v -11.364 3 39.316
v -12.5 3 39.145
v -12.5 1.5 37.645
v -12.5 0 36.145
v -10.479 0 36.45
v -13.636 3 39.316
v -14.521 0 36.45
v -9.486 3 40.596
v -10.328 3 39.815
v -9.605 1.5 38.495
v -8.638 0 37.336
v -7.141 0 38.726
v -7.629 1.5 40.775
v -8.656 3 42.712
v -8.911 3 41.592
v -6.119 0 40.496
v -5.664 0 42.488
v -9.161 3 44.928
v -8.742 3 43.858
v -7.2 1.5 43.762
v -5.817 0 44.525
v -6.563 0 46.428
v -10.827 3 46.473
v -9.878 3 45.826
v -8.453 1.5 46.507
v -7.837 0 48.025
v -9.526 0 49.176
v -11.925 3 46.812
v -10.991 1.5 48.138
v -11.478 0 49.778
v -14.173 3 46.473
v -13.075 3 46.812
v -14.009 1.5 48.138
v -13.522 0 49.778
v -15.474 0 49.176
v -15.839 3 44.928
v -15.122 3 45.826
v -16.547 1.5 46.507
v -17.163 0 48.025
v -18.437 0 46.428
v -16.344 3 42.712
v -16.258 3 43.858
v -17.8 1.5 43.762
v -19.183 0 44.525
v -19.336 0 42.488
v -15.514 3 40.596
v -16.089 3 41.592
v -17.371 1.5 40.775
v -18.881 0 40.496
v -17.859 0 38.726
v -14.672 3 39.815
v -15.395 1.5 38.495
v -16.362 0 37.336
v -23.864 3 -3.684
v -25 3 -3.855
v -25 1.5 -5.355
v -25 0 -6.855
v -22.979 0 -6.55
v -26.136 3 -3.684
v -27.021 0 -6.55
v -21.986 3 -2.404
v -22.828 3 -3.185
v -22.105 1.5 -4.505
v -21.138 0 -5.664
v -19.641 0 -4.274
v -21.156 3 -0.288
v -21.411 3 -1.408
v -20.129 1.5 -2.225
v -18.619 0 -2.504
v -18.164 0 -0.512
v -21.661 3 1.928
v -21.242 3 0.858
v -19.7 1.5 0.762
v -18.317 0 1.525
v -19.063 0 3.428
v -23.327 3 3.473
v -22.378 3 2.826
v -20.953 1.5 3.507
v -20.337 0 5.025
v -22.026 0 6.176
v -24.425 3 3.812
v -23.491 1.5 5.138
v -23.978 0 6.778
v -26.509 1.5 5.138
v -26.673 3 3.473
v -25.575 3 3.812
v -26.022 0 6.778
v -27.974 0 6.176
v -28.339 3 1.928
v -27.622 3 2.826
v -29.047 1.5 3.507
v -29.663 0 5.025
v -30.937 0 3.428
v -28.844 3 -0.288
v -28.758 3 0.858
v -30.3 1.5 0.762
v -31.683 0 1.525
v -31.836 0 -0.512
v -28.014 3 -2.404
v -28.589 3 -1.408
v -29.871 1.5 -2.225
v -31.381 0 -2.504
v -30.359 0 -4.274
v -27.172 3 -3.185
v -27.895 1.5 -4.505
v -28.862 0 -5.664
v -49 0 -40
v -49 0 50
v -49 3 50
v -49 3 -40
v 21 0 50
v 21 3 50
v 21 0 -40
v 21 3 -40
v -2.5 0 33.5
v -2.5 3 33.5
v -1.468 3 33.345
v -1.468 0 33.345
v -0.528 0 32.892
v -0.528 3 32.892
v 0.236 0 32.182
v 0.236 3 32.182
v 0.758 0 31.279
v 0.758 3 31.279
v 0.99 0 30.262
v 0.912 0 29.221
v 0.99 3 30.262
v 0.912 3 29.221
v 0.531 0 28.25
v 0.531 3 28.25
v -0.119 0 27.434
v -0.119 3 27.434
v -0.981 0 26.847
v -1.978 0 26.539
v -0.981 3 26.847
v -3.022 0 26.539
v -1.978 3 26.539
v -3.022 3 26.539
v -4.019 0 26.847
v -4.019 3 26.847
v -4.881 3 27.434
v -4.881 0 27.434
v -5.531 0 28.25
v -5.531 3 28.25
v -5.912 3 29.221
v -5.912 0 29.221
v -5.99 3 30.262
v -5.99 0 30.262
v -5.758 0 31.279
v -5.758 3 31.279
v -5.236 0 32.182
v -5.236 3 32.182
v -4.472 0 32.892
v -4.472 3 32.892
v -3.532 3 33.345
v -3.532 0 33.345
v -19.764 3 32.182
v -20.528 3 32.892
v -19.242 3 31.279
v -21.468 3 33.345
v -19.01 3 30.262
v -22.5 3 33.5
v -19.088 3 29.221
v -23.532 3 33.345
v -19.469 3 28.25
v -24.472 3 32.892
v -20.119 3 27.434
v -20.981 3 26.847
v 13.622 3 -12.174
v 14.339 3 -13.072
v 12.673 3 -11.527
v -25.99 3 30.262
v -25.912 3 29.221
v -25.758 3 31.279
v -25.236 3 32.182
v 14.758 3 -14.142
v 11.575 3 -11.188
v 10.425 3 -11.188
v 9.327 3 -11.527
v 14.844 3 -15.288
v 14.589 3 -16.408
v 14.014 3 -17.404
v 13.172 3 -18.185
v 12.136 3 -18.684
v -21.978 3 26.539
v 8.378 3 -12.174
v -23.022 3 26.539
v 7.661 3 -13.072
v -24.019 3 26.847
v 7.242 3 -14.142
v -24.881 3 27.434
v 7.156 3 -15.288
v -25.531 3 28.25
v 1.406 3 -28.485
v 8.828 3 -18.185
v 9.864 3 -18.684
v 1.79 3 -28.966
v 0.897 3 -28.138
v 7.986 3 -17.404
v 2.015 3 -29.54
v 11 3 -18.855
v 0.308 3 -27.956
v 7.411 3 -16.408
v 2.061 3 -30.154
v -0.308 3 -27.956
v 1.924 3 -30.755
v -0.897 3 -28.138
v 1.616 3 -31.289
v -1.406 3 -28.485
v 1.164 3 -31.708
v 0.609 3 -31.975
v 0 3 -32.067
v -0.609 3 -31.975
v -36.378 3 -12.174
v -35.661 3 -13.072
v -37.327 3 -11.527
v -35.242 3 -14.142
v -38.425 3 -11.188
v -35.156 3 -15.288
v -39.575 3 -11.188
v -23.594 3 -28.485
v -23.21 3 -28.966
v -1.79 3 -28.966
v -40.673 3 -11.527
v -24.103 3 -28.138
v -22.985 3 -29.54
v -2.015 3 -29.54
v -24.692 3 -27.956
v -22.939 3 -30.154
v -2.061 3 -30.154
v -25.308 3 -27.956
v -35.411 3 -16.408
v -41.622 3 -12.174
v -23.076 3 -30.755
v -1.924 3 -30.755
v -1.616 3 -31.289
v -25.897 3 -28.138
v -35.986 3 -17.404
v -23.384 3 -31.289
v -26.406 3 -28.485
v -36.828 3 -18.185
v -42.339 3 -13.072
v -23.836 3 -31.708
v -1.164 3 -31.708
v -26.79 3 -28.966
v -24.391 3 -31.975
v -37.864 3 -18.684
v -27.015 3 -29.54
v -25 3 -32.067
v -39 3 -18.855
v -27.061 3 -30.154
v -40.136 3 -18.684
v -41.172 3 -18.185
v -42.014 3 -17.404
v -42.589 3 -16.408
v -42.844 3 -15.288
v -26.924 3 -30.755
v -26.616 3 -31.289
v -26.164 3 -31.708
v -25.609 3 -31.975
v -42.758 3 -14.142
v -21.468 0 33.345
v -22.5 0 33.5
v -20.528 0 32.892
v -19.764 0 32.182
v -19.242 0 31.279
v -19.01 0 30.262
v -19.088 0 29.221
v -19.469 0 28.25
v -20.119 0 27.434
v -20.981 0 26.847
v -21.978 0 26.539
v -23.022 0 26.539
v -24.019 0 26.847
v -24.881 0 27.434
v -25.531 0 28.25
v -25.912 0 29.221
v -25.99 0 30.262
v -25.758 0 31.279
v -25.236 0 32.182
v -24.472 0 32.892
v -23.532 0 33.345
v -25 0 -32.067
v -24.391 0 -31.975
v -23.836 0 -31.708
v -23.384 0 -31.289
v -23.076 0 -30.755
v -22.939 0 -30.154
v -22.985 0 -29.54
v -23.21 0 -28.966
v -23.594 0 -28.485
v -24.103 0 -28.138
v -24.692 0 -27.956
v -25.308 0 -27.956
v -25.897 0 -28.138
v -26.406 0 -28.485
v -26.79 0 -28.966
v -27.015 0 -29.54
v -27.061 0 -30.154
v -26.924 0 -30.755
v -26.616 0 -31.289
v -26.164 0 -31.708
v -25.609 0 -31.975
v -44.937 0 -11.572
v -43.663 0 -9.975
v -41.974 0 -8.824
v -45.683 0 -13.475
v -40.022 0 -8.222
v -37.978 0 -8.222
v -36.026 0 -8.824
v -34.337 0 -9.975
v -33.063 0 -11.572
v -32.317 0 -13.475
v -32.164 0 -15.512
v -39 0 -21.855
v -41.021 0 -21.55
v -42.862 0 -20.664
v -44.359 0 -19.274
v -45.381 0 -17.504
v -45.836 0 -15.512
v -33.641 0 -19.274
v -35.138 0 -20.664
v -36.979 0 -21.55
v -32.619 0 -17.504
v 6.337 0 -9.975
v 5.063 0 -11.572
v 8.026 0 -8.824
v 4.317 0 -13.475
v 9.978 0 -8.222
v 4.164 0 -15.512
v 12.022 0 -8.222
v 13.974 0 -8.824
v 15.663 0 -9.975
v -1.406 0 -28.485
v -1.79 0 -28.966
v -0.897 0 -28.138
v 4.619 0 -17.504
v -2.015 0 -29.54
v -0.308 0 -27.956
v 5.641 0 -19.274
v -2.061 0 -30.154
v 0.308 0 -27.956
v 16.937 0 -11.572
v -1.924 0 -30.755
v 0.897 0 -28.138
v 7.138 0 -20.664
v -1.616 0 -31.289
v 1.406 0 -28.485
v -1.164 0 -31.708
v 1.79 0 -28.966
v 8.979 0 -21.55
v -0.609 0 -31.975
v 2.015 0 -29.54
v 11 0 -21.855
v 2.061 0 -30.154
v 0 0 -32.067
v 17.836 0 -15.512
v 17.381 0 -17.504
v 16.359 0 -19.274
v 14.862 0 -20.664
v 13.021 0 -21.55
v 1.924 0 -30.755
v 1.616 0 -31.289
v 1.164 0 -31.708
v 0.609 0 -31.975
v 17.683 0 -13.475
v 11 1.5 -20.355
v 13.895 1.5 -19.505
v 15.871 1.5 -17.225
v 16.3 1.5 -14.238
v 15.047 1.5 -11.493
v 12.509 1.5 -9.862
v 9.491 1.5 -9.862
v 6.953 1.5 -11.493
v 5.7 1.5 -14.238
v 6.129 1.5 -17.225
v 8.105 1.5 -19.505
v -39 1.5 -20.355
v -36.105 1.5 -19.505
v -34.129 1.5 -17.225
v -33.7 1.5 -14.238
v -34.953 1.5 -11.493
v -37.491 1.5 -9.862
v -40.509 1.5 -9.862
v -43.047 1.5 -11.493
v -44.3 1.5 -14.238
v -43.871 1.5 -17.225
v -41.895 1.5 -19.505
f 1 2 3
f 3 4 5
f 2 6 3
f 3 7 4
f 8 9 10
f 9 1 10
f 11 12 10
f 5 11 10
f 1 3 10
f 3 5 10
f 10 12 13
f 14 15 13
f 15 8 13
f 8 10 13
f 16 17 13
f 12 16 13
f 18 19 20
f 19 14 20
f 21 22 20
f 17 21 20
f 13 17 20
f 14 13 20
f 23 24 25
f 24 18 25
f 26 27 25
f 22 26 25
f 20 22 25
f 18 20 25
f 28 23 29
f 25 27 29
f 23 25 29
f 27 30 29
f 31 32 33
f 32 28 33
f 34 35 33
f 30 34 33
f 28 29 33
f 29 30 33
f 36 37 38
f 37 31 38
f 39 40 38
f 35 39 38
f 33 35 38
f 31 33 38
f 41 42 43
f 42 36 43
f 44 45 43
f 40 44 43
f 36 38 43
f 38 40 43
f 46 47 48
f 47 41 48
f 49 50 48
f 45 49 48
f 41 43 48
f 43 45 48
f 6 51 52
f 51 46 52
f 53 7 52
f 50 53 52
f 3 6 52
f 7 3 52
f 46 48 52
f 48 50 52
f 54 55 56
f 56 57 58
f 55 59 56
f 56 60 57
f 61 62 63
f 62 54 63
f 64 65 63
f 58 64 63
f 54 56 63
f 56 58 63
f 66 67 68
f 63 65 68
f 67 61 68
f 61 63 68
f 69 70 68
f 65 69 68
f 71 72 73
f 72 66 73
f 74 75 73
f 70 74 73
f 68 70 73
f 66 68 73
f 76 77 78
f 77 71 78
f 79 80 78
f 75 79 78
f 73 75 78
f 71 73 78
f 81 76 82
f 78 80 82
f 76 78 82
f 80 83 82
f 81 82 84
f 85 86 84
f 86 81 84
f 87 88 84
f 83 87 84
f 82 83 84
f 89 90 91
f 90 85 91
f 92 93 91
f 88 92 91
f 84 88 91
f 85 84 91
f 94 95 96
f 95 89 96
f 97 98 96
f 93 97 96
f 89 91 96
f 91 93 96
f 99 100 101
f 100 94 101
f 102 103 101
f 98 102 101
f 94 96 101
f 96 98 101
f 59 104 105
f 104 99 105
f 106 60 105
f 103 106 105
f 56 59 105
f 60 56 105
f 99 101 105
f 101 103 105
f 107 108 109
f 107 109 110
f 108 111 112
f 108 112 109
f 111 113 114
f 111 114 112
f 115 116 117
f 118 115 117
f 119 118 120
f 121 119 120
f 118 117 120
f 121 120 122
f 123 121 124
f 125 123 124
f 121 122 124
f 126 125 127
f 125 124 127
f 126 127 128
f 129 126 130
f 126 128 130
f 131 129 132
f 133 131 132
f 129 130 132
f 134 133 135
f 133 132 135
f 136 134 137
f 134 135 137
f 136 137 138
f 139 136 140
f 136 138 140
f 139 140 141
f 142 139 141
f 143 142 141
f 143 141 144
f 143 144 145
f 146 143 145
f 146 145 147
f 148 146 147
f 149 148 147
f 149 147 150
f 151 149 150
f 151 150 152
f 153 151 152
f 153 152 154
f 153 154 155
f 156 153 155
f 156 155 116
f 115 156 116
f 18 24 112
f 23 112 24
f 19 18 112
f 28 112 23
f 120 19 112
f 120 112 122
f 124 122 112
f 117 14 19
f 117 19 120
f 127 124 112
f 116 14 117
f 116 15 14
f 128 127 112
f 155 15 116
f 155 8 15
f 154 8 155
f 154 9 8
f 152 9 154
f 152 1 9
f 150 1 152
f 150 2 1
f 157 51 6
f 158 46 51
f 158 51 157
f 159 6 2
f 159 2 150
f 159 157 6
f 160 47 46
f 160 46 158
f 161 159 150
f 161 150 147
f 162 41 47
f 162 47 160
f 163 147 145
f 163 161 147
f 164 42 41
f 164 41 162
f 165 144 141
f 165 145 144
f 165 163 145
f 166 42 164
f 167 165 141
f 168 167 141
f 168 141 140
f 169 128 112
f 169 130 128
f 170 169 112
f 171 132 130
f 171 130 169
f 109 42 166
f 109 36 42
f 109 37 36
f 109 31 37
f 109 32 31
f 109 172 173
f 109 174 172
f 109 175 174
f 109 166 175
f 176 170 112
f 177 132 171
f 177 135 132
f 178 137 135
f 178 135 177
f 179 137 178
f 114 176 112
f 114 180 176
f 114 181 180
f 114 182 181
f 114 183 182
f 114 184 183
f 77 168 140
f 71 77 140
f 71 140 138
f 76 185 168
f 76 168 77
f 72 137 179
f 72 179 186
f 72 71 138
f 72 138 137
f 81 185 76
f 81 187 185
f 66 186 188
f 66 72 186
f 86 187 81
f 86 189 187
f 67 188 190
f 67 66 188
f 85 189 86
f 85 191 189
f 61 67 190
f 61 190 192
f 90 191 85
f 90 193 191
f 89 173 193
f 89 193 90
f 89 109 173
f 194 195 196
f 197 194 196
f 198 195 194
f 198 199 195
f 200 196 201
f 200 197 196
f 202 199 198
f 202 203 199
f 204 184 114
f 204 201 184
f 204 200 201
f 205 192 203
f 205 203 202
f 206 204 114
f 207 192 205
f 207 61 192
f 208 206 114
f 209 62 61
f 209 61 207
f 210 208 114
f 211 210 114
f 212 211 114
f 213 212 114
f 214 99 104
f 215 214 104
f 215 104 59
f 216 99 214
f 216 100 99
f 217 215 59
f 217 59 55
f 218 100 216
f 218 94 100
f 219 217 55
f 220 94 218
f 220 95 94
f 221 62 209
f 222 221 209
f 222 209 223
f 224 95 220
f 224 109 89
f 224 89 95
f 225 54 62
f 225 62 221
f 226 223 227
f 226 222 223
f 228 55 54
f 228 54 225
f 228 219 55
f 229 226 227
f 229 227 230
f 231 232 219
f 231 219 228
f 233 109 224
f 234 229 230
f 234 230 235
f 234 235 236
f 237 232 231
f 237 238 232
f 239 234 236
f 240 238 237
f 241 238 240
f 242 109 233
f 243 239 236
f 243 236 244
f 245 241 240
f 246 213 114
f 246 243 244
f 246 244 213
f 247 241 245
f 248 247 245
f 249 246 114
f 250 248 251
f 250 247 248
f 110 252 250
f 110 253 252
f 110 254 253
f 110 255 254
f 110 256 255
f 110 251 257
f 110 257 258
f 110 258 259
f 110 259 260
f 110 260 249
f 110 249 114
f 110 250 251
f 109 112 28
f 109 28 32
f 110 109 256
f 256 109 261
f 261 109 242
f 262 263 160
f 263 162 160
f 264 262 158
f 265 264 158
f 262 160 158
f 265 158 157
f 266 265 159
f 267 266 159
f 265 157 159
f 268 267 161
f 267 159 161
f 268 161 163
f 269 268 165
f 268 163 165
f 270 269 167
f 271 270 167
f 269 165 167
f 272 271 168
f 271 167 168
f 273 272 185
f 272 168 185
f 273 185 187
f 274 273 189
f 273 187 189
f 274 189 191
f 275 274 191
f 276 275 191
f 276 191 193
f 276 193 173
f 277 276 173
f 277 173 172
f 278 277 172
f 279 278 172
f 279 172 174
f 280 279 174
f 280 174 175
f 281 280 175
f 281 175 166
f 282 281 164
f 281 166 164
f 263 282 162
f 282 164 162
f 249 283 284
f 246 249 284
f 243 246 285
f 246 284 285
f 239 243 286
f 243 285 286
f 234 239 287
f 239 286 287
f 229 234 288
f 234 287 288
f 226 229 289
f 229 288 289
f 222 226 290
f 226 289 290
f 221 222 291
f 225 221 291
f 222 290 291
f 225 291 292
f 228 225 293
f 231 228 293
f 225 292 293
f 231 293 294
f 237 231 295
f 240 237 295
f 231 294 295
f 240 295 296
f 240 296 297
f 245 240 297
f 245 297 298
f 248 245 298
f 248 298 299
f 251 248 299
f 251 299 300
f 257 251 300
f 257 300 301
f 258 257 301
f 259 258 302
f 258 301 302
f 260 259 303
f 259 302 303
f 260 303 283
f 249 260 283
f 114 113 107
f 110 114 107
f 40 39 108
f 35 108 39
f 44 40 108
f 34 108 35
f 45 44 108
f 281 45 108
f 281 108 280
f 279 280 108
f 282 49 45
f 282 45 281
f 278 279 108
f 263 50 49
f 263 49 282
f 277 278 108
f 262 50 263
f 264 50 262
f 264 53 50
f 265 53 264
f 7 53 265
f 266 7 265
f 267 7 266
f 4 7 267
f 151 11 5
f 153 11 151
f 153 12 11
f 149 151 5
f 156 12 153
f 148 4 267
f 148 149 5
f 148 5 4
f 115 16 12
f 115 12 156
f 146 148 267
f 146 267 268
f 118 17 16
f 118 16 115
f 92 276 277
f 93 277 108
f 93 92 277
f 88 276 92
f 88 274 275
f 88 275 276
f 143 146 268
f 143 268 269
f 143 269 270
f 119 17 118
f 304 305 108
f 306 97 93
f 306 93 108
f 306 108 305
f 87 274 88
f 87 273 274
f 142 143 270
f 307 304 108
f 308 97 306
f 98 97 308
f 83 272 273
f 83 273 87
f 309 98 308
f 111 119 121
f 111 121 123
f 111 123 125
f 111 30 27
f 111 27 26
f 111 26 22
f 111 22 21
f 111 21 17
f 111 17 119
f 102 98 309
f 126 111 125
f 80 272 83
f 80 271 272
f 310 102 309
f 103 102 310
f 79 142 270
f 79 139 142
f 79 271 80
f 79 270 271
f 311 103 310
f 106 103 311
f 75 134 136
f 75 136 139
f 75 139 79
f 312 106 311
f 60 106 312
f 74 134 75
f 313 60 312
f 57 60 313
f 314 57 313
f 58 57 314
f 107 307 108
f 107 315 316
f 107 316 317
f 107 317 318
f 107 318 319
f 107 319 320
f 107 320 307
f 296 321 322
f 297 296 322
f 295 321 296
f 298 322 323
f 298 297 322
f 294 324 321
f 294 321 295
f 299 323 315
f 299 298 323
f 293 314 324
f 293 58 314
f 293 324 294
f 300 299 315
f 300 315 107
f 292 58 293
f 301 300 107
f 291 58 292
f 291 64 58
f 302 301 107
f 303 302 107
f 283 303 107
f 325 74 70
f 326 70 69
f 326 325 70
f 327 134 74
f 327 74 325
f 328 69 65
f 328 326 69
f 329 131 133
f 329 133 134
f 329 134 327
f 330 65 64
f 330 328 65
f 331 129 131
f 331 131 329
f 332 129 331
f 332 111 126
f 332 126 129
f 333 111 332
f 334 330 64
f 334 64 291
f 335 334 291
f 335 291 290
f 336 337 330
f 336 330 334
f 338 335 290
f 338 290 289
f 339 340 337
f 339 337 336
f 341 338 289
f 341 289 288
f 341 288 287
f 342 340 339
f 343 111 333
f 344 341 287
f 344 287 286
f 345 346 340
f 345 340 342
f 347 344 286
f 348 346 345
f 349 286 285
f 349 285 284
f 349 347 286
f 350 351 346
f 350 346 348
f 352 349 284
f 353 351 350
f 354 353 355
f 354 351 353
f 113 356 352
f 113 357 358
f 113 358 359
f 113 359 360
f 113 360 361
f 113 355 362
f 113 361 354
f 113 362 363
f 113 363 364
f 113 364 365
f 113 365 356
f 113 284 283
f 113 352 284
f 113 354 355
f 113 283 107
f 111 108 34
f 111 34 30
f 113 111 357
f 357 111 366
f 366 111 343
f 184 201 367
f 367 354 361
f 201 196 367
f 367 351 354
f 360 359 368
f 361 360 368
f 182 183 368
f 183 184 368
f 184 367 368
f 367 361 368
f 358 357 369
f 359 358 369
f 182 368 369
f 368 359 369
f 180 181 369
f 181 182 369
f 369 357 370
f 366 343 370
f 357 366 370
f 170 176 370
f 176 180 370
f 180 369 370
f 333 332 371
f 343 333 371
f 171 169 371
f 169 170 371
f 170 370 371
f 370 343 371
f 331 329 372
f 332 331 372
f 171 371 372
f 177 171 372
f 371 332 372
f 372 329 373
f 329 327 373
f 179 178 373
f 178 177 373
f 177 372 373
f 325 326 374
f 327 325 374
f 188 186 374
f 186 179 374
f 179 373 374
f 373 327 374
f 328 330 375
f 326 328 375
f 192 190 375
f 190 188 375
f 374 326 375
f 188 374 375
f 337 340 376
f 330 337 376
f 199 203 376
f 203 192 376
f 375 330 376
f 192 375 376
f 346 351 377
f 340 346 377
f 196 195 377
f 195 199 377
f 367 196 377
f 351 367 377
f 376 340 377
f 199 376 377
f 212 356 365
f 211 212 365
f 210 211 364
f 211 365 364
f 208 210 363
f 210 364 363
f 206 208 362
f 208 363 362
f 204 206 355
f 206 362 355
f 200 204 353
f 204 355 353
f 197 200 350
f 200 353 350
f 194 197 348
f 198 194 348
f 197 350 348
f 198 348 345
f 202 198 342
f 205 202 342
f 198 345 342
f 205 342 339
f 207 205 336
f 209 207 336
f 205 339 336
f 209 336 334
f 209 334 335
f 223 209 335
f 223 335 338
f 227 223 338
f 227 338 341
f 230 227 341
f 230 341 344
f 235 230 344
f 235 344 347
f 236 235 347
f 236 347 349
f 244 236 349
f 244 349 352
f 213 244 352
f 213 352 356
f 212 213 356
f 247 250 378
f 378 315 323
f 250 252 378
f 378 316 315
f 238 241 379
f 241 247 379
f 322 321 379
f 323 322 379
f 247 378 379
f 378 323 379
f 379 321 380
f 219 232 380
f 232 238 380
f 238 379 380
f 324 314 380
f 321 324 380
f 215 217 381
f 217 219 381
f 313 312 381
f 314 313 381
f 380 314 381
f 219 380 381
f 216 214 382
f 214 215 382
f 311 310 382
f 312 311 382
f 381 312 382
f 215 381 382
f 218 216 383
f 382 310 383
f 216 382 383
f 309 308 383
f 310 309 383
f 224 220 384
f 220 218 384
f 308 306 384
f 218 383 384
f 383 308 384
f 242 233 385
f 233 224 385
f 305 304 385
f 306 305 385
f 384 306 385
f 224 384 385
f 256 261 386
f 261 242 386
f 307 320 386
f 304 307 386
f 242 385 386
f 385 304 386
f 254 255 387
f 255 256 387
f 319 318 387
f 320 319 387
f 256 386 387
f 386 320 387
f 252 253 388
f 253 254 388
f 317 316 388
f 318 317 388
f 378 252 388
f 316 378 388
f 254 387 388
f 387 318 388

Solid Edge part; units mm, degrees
sketch "Sketch1" plane through (0, 0, 0) normal (0, -1, 0) x (1, 0, 0)
  line L0 (16, 20) -> (-44, 20)
  line L1 (-44, 20) -> (-44, -20)
  line L2 (-44, -20) -> (16, -20)
  line L3 (16, -20) -> (16, 20)
  dimension "D1" = 60
  dimension "D2" = 40
extrude "Protrusion1" add sketch "Sketch1" against normal blind 24.5
sketch "Sketch2" plane through (-14, 24.5, 0) normal (0, 1, 0) x (0, 0, 1)
  line L0 (-16, -24.5) -> (16, -24.5)
  line L1 (16, -24.5) -> (16, 25.5)
  line L2 (16, 25.5) -> (-16, 25.5)
  line L3 (-16, 25.5) -> (-16, -24.5)
  dimension "D1" = 50
  dimension "D2" = 32
  dimension "D3" = 11.5
extrude "VaciadoExtruido_2" cut sketch "Sketch2" against normal blind 10
sketch "Sketch3" plane through (-13.5, 14.5, 0) normal (0, 1, 0) x (0, 0, 1)
  line L0 (-10.5, -19.5) -> (10.5, -19.5)
  line L1 (10.5, -19.5) -> (10.5, 13.5)
  line L2 (10.5, 13.5) -> (-10.5, 13.5)
  line L3 (-10.5, 13.5) -> (-10.5, -19.5)
  dimension "D1" = 33
  dimension "D2" = 21
extrude "VaciadoExtruido_3" cut sketch "Sketch3" against normal blind 3
sketch "Sketch4" plane through (-14, 0, 0) normal (0, -1, 0) x (0, 0, -1)
  line L0 (-20, 30) -> (-50, 30)
  line L1 (-50, 30) -> (-50, -30)
  line L2 (-50, -30) -> (-20, -30)
  dimension "D1" = 30
extrude "Protrusion2" add sketch "Sketch4" against normal up to vertex (12.25 mm away) material side at (15.95, 0, 35)
hole "Agujero_1" at (-25, 12.25, 0) direction (0, -1, 0) diameter 7 end through all
hole "Hole1" at (-2.5, 12.25, 30) direction (0, -1, 0) diameter 7 end through all
hole "Hole2" at (-22.5, 12.25, 30) direction (0, -1, 0) diameter 7 end through all
sketch "Sketch5" plane through (-44, 12.25, 15) normal (-1, 0, 0) x (0, 0, -1)
  line L0 (-35, 9.25) -> (35, 9.25)
  line L1 (35, 9.25) -> (35, -12.25)
  line L2 (35, -12.25) -> (-35, -12.25)
  line L3 (-35, -12.25) -> (-35, 9.25)
  dimension "D1" = 3
extrude "Cutout1" cut sketch "Sketch5" against normal through all
sketch "Sketch6" plane through (-14, 0, 15) normal (0, -1, 0) x (-1, 0, 0)
  line L0 (30, -35) -> (30, 35)
  line L1 (-30, 35) -> (30, 35)
  line L2 (-30, 35) -> (-30, -35)
  line L3 (-35, -35) -> (-30, -35)
  line L4 (-35, 40) -> (-35, -35)
  line L5 (-35, 40) -> (35, 40)
  line L6 (35, -35) -> (35, 40)
  line L7 (30, -35) -> (35, -35)
  dimension "D1" = 5
  dimension "D2" = 5
  dimension "D3" = 5
  dimension "D4" = 5
  dimension "D5" = 5
  dimension "D6" = 75
  dimension "D7" = 70
extrude "Protrusion3" add sketch "Sketch6" against normal up to vertex (3 mm away)
hole "Agujero_4" at (11, 0, -15) direction (0, 1, 0) diameter 7 end through all countersink diameter 13.71 countersink angle 90
hole "Hole3" at (-39, 0, -15) direction (0, 1, 0) diameter 7 end through all countersink diameter 13.71 countersink angle 90
hole "Hole4" at (-12.5, 0, 43) direction (0, 1, 0) diameter 7 end through all countersink diameter 13.71 countersink angle 90
hole "Hole5" at (-25, 0, 0) direction (0, 1, 0) diameter 7 end through all countersink diameter 13.71 countersink angle 90
sketch "Sketch7" plane through (-14, 0, 12.5) normal (0, -1, 0) x (-1, 0, 0)
  line L0 (-35, 52.5) -> (35, 52.5)
  line L1 (35, 52.5) -> (35, 37.5)
  line L2 (-35, 37.5) -> (35, 37.5)
  line L3 (-35, 37.5) -> (-35, 52.5)
extrude "Protrusion4" add sketch "Sketch7" against normal up to vertex (3 mm away)
hole "Agujero_12" at (-25, 0, -30) direction (0, 1, 0) diameter 4.134 end up to next thread major 5 thread length 2
hole "Hole6" at (0, 0, -30) direction (0, 1, 0) diameter 4.134 end up to next thread major 5 thread length 2
